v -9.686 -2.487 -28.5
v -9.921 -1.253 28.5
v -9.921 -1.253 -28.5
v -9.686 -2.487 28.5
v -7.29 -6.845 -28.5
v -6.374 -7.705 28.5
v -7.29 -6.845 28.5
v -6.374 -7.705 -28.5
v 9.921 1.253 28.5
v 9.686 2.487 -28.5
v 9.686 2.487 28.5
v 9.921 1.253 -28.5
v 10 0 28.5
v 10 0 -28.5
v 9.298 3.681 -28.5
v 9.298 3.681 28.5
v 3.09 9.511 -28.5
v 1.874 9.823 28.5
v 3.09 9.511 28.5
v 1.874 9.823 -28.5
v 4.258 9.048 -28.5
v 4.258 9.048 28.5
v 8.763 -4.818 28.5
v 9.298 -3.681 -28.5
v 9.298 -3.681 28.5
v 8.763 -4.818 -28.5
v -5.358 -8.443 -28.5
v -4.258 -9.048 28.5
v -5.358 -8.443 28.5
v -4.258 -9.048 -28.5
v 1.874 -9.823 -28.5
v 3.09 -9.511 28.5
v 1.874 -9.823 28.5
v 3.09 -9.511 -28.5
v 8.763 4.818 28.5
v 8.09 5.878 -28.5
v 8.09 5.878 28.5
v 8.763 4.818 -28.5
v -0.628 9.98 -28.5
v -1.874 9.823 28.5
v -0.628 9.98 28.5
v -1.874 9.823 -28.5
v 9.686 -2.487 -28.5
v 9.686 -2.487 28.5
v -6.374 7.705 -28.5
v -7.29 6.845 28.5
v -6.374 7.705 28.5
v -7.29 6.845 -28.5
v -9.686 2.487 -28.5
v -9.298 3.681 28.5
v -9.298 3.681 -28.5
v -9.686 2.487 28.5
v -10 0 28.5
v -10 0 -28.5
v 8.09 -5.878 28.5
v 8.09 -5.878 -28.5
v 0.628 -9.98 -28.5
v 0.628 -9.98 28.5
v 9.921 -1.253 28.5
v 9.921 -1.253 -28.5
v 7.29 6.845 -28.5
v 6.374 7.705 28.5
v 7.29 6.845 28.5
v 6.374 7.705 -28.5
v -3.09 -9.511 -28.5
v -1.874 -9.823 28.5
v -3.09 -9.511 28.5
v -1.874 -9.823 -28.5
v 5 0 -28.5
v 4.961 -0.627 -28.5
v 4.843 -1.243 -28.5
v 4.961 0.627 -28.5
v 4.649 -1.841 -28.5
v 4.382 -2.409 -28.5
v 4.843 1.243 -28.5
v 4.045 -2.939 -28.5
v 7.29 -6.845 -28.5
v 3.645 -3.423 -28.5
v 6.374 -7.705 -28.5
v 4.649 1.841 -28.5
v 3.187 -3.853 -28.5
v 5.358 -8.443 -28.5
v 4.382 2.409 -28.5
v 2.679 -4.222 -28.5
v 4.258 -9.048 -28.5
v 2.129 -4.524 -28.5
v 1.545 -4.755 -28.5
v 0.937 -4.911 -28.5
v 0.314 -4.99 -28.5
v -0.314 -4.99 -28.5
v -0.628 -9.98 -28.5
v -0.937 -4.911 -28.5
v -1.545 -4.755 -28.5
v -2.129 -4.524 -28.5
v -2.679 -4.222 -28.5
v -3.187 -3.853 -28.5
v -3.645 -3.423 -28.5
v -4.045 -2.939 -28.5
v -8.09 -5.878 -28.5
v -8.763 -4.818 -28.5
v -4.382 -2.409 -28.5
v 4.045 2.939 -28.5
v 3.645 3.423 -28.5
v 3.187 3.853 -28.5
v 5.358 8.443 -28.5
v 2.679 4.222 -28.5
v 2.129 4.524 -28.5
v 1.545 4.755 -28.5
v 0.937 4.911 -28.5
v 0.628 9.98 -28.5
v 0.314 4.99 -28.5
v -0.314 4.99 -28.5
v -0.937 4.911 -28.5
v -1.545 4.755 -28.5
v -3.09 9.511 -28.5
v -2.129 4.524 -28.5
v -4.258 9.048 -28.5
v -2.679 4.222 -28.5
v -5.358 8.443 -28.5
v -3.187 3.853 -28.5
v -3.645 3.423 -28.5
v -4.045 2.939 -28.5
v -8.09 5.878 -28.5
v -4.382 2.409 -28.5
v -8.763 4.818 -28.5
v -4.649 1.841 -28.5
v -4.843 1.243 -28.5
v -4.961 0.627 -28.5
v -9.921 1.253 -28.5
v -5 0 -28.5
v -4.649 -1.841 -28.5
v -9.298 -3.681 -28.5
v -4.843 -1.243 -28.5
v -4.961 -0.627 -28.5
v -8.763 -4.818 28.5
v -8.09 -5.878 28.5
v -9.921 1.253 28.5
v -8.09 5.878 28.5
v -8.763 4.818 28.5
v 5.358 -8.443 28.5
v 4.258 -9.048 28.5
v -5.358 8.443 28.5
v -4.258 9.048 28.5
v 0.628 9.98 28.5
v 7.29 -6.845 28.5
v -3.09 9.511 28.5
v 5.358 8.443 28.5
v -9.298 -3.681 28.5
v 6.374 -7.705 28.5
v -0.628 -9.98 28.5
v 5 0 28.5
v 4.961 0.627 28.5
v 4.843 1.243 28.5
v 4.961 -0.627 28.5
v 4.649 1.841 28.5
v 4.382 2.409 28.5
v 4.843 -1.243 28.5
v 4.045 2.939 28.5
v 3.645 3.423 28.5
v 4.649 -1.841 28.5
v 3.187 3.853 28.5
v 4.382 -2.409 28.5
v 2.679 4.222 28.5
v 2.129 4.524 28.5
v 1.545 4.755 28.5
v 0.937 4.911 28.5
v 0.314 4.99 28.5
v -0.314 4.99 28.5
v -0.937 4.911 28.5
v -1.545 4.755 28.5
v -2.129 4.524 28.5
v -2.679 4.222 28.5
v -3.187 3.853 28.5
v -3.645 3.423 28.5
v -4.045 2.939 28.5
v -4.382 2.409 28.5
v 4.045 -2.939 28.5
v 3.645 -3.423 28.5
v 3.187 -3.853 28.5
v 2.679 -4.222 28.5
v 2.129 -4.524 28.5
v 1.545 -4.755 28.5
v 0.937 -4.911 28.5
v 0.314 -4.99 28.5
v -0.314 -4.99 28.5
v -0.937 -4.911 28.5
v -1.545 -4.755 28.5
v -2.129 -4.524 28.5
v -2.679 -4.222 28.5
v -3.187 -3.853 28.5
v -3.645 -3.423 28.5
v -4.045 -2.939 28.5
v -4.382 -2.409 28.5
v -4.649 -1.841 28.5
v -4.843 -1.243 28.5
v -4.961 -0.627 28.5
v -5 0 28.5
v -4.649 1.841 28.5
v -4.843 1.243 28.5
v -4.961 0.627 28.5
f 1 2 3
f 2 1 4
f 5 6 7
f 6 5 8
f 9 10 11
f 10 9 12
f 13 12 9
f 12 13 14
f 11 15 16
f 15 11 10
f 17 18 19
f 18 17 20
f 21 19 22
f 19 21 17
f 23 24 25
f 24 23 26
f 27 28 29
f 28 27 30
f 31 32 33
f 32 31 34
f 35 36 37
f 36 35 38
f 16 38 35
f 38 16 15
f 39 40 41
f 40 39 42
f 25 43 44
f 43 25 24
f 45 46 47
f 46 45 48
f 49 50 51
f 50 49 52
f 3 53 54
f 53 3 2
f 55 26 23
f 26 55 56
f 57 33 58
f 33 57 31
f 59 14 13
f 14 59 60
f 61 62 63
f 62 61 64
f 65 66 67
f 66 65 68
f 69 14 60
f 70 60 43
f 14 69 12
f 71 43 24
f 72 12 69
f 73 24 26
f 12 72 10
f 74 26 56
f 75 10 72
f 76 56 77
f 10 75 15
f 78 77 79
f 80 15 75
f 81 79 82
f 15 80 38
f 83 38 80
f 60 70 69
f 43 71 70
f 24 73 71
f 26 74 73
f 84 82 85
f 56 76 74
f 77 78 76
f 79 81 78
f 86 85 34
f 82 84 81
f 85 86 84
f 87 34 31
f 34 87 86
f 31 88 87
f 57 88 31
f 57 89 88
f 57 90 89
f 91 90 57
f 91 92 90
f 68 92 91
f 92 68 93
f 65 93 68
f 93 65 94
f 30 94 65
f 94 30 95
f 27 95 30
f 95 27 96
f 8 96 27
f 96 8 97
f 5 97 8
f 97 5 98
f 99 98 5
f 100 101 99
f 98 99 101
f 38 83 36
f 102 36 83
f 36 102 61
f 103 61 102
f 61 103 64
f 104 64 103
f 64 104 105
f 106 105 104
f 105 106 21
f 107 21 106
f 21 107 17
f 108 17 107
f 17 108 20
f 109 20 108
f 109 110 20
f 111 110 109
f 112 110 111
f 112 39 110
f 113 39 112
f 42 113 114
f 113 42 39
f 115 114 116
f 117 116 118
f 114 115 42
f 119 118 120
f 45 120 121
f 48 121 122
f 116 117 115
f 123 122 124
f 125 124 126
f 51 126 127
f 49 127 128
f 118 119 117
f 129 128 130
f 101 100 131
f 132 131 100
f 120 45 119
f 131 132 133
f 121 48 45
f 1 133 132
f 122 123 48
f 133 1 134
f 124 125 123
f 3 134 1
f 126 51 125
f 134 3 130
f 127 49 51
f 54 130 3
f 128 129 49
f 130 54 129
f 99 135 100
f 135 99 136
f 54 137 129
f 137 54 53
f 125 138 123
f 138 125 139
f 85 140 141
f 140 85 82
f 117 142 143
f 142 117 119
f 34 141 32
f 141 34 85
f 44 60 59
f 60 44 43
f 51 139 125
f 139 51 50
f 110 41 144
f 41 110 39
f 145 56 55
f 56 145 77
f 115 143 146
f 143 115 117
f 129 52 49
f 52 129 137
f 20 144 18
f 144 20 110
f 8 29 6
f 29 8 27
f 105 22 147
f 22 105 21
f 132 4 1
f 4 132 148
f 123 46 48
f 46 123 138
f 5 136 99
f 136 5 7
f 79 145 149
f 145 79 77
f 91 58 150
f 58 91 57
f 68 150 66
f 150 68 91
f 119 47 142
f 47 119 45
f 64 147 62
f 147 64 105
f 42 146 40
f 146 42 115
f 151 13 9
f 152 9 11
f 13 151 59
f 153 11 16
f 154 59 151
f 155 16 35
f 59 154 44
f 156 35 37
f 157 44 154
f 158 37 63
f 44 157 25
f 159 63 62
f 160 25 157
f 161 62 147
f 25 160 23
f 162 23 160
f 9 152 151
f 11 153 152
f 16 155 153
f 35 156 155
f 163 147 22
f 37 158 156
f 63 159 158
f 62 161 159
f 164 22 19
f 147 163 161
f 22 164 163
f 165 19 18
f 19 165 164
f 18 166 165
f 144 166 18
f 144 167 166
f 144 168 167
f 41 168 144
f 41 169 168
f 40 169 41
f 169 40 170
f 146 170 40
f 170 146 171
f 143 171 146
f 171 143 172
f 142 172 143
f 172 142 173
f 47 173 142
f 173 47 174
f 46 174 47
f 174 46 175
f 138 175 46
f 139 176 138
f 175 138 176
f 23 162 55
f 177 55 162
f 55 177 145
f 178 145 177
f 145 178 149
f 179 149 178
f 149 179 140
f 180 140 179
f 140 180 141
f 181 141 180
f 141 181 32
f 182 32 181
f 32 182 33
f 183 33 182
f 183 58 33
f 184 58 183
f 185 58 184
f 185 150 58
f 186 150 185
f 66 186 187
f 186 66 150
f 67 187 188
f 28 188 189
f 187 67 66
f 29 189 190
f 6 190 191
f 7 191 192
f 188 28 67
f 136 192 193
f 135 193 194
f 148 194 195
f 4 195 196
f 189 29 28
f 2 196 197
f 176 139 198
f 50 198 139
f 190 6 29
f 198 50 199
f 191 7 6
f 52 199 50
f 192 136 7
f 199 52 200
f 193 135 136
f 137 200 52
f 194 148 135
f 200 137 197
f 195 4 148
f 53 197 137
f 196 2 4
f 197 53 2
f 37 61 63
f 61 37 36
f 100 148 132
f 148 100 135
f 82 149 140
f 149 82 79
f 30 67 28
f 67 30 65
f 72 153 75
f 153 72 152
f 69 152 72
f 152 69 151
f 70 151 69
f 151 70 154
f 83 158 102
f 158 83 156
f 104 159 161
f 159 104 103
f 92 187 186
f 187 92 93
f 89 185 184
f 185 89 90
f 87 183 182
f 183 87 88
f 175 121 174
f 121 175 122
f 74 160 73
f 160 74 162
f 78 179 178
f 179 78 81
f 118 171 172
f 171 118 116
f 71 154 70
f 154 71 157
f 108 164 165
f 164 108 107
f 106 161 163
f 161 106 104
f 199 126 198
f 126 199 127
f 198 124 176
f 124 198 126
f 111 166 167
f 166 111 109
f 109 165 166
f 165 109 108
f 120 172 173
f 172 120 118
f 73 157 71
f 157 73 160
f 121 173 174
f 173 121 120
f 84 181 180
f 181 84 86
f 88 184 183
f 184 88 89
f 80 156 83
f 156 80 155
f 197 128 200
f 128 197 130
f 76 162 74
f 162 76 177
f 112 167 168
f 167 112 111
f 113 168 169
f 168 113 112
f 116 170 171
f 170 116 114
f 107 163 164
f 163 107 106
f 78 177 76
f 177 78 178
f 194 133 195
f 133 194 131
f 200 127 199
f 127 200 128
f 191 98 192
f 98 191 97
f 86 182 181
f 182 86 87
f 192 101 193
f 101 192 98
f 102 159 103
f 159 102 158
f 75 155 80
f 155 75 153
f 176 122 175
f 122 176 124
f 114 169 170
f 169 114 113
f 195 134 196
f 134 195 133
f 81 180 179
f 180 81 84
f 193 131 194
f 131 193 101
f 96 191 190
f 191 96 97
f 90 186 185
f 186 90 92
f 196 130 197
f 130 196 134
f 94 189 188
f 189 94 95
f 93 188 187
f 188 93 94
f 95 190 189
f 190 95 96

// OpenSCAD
$fn = 50;


difference() {
	union() {
		translate(v = [0, 0, -28.5000000000]) {
			cylinder(h = 57, r = 10.0000000000);
		}
	}
	union() {
		translate(v = [0, 0, -100.0000000000]) {
			cylinder(h = 200, r = 5.0000000000);
		}
	}
}
